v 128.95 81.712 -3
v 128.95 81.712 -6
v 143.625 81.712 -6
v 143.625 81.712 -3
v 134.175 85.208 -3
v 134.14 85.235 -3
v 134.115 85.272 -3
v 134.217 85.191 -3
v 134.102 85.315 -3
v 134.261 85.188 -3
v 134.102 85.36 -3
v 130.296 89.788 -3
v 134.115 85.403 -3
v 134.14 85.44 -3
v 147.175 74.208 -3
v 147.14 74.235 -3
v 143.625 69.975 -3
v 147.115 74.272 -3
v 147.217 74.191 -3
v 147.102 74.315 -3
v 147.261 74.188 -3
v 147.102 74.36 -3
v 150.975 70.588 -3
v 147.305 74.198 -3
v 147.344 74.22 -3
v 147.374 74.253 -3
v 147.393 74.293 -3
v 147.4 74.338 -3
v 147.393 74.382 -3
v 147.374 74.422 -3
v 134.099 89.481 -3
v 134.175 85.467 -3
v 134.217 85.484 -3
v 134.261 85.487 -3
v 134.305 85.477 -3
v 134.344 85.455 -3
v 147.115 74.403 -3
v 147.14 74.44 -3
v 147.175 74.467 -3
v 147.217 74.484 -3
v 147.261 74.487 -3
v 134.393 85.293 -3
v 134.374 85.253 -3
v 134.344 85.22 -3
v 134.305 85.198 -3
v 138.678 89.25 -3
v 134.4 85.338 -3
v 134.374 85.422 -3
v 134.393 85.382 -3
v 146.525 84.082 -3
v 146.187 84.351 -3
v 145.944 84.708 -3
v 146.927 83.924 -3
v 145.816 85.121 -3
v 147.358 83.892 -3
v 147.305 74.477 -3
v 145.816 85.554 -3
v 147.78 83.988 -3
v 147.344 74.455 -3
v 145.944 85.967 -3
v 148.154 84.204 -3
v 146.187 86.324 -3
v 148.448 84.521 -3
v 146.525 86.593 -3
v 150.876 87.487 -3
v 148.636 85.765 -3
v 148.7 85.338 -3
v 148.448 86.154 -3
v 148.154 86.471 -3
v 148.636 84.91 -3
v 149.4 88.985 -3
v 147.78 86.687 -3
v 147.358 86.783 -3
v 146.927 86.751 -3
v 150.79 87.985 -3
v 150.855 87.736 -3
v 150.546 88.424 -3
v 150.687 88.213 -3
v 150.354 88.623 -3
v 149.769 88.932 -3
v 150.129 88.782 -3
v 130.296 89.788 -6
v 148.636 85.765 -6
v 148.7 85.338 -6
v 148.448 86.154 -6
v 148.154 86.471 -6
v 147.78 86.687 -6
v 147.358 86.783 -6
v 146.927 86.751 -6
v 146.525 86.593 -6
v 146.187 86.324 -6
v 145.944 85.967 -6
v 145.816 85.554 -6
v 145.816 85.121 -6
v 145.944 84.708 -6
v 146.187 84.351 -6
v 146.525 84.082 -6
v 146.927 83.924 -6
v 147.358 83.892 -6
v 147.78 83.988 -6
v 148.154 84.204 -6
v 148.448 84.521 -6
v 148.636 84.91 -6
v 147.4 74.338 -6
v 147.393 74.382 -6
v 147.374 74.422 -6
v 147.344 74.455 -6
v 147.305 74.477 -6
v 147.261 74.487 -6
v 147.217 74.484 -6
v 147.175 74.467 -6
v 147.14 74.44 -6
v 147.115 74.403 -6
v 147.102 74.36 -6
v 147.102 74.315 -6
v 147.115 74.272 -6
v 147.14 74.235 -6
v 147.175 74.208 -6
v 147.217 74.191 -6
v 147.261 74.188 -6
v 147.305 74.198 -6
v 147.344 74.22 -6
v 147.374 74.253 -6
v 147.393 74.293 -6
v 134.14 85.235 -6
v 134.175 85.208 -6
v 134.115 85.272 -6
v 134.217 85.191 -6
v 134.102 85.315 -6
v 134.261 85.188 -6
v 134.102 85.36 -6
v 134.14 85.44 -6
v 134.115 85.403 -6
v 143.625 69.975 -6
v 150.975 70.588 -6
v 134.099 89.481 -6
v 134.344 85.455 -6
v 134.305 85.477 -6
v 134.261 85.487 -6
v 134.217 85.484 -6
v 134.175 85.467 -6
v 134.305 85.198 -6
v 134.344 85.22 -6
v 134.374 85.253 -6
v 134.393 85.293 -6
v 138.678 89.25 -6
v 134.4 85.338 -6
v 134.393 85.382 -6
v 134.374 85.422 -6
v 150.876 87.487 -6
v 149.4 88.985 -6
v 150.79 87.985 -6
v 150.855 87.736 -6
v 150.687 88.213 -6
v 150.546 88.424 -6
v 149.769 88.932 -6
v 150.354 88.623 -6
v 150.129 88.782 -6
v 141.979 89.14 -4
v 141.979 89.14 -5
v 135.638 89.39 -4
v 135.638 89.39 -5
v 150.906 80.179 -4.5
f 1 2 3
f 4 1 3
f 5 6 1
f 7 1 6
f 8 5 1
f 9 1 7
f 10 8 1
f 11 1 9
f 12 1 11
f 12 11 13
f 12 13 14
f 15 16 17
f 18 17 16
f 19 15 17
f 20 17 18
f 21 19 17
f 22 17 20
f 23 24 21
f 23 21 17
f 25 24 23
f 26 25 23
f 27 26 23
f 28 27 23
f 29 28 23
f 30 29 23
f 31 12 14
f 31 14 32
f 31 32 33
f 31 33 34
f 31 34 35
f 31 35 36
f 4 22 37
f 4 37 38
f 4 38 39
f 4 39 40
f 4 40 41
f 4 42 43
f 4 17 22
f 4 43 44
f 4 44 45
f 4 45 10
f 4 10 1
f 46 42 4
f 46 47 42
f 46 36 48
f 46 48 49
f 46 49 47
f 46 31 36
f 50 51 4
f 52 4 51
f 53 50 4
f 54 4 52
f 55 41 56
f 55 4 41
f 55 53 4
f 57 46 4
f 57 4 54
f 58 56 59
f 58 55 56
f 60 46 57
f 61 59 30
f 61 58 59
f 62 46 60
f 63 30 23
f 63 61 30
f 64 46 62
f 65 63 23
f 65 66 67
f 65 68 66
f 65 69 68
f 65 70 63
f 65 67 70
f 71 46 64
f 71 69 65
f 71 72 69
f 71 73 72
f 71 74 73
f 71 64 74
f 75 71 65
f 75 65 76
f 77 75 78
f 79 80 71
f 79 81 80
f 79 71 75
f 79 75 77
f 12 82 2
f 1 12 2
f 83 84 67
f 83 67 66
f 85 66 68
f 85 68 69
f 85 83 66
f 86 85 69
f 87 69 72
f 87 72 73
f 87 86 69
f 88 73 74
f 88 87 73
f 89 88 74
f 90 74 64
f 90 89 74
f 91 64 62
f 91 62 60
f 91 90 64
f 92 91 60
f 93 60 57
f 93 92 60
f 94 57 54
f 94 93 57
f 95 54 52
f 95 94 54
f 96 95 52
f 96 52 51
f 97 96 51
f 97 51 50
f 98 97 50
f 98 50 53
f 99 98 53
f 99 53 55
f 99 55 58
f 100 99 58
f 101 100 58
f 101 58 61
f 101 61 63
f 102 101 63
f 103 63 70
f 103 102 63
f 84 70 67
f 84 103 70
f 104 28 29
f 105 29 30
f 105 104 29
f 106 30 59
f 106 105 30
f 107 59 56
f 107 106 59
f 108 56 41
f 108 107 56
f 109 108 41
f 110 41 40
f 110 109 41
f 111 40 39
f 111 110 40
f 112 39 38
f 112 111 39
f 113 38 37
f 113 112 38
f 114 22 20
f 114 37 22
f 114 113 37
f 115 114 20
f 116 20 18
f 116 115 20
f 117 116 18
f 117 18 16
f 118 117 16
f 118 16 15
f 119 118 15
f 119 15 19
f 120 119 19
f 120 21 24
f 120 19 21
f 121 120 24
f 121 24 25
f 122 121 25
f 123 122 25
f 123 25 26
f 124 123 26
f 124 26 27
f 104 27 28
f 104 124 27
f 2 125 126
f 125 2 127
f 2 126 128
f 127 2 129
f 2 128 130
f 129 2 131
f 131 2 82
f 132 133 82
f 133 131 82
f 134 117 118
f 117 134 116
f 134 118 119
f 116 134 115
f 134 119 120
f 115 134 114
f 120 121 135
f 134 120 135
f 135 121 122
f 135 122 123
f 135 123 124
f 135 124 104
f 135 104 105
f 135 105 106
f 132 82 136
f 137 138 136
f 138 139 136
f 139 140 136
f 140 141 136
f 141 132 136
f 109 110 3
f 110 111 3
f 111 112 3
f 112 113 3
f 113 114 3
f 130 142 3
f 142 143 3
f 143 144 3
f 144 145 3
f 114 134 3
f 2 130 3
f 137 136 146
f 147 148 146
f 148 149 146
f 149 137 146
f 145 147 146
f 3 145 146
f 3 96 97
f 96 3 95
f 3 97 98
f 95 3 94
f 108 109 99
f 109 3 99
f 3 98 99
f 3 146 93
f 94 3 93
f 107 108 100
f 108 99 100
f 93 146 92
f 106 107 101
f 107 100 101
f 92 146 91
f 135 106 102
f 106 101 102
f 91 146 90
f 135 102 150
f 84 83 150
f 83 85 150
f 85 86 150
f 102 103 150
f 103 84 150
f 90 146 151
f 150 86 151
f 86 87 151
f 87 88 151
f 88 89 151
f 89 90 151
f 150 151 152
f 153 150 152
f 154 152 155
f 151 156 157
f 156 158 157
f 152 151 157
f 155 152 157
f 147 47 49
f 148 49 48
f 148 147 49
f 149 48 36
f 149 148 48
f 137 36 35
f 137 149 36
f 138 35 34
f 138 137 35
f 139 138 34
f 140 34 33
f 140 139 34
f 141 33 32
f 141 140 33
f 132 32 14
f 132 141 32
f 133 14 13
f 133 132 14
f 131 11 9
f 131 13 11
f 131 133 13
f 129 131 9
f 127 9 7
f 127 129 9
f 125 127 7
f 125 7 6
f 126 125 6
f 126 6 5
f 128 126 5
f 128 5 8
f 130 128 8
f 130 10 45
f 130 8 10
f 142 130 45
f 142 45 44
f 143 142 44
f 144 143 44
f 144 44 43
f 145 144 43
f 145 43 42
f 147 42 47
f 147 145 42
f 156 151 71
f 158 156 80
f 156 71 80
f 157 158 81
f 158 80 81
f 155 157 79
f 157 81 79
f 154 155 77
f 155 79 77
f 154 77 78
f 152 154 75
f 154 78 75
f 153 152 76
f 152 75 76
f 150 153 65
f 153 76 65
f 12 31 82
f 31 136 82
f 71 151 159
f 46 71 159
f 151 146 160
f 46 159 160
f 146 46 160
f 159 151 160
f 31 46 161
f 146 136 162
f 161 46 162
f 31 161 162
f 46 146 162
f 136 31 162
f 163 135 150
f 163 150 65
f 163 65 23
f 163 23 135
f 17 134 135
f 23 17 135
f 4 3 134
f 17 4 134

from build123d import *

# Parameters (mm, degrees)
SKETCH055_R     = 1.45
PAD014_DEPTH    = 3
SKETCH060_R     = 0.15
POCKET028_DEPTH = 22
FILLET012_R     = 1.5


with BuildPart() as part:
    # Sketch055 → Pad014 (new body)
    with BuildSketch(Plane.XY):
        with BuildLine():
            add(Edge.make_bspline(
                [(150.875, 88.9625), (142.177266, 89.087472), (135.460331, 89.269548), (130.29585, 89.7876)],
                knots=[0, 0, 0, 0, 1, 1, 1, 1], degree=3))
            Line((130.29585, 89.7876), (128.95, 81.7125))
            Line((128.95, 81.7125), (143.625, 81.7125))
            Line((143.625, 81.7125), (143.625, 69.975))
            Line((143.625, 69.975), (150.975266, 70.587522))
            add(Edge.make_bspline(
                [(150.875, 88.9625), (150.875, 82.6662), (150.975266, 70.587522)],
                knots=[0, 0, 0, 1, 1, 1], degree=2))
        make_face()
        with Locations((147.25, 85.3375)):
            Circle(SKETCH055_R, mode=Mode.SUBTRACT)
    extrude(amount=PAD014_DEPTH)

    # Sketch060 → Pocket028 (cut)
    with BuildSketch(Plane.XY):
        with Locations((134.25, 85.3375)):
            Circle(SKETCH060_R)
        with Locations((147.25, 74.3375)):
            Circle(SKETCH060_R)
    extrude(amount=POCKET028_DEPTH, mode=Mode.SUBTRACT)

    # Fillet012
    fillet012_edges = [part.edges().sort_by_distance(p)[0] for p in [
        (150.875, 88.9625, 1.5),
    ]]
    fillet(fillet012_edges, radius=FILLET012_R)


with BuildPart() as part_1:
    # Body013 placement: moved
    add(part.part.moved(Location((0, 0, -6))))


solid = part_1.part
